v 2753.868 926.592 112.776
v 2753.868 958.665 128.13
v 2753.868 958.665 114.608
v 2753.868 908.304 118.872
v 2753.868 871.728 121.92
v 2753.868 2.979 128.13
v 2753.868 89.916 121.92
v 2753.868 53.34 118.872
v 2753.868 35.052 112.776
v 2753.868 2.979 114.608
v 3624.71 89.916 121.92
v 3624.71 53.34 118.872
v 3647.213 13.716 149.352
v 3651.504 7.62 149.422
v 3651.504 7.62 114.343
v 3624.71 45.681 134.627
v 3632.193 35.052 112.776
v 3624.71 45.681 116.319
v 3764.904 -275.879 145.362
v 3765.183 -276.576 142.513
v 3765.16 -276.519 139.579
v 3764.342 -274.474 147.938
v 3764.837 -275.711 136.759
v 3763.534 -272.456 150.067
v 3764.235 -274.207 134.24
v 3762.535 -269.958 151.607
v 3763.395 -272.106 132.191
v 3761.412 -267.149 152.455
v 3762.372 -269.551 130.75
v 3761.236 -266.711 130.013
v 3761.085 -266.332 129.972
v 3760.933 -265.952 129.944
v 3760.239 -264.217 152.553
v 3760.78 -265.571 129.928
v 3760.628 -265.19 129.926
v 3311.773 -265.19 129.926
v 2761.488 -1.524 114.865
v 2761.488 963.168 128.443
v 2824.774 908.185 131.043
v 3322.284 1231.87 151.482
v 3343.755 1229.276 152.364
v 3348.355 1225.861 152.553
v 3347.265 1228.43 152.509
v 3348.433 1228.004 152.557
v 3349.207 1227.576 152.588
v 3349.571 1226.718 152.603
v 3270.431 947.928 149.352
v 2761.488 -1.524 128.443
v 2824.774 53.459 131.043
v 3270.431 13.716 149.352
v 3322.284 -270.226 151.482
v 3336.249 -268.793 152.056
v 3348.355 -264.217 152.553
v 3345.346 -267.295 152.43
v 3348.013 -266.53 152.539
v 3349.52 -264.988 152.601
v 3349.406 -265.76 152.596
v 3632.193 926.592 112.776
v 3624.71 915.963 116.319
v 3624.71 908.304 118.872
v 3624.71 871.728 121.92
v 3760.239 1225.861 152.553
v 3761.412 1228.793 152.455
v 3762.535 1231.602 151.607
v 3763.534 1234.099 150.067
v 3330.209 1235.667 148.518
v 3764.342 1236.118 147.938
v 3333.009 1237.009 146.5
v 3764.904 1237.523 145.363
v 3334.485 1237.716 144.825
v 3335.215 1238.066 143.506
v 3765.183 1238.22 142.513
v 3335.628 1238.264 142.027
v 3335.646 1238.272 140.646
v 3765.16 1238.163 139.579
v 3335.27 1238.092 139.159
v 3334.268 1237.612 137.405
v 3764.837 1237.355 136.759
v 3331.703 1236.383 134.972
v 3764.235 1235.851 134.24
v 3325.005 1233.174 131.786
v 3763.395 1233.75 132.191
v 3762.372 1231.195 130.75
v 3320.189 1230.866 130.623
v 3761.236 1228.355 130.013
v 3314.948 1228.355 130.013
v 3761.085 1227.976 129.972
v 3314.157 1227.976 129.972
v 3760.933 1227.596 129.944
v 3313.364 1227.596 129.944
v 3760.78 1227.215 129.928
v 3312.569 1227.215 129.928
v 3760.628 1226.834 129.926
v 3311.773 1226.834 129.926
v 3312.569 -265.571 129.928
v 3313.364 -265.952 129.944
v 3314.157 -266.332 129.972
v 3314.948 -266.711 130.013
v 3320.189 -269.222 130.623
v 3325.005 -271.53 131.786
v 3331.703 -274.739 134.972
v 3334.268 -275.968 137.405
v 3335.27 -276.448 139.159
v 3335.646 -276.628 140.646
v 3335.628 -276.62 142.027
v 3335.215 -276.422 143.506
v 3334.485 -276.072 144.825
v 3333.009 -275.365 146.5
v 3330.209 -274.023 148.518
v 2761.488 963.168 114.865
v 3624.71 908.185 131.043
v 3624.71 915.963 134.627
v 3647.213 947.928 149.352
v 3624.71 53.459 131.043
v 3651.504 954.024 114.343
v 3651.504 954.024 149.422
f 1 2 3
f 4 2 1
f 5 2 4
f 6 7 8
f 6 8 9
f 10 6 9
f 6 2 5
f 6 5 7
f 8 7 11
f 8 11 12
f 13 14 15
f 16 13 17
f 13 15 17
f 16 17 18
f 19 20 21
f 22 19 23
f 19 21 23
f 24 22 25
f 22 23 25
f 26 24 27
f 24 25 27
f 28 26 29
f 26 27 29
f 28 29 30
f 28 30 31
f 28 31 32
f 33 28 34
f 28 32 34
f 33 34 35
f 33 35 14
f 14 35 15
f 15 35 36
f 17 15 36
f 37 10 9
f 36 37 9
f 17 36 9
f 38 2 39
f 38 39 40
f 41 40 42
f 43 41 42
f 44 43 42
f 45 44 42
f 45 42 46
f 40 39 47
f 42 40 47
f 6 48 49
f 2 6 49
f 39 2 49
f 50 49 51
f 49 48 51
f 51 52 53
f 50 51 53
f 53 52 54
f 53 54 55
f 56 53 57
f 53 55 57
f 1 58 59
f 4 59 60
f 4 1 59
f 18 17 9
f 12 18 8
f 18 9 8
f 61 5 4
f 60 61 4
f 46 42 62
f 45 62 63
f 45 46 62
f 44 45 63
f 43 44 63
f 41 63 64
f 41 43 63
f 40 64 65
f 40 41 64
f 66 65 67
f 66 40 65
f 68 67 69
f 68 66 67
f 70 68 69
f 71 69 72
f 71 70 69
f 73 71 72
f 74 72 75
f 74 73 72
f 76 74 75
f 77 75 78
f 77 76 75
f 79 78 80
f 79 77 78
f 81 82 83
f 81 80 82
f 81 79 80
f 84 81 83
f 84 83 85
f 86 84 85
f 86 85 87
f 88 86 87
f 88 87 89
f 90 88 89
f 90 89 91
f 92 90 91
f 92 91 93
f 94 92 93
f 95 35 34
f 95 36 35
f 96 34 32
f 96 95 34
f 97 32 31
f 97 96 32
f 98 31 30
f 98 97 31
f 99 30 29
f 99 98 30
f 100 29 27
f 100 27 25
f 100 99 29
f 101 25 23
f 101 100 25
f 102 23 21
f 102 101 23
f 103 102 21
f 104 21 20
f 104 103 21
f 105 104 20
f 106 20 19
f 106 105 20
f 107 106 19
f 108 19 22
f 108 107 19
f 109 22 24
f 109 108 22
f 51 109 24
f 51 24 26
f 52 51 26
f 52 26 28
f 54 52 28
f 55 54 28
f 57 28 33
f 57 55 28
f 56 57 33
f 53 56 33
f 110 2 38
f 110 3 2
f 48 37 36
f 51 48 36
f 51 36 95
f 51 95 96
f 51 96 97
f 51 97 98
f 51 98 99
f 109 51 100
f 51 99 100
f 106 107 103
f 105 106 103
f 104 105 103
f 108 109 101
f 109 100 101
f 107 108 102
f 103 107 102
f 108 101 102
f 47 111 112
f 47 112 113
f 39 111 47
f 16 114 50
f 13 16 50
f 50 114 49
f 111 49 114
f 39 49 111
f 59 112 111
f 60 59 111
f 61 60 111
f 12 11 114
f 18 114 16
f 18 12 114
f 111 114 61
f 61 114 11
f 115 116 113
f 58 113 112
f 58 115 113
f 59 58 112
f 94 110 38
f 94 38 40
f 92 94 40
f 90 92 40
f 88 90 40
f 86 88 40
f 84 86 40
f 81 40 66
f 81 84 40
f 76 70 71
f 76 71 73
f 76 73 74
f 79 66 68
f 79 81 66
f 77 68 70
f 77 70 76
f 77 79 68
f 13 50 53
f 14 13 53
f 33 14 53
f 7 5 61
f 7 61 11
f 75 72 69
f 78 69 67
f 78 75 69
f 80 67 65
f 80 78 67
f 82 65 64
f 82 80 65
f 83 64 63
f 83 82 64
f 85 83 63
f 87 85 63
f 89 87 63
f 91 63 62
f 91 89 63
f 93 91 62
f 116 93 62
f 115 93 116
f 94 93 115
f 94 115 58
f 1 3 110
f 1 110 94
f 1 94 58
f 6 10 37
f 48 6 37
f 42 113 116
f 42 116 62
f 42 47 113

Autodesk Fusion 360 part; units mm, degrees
sketch "Sketch9" plane through (0, 0, 0) normal (0, 0, 1) x (1, 0, 0)
  line L0 (3776.472, 1266.444) -> (3776.472, -304.8)
  line L1 (3776.472, 480.822) -> (2072.6401, 480.822)
  line L2 (3775.8634, 1264.9224) -> (3651.504, 954.024)
  line L3 (3651.504, 954.024) -> (3624.7105, 915.963)
  line L4 (2627.376, 883.92) -> (2761.488, 963.168)
  line L5 (2761.488, 963.168) -> (3394.4421, 1266.444)
  line L6 (3394.4421, 1266.444) -> (3775.8634, 1264.9224)
  line L7 (3775.8634, -303.2784) -> (3651.504, 7.62)
  line L8 (3651.504, 7.62) -> (3624.7105, 45.681)
  line L9 (2761.488, -1.524) -> (3394.4421, -304.8)
  line L10 (3394.4421, -304.8) -> (3775.8634, -303.2784)
  line L11 (2627.376, 77.724) -> (2761.488, -1.524)
  line L12 (2627.376, 883.92) -> (2627.376, 77.724)
  line L13 (3624.7105, 915.963) -> (3624.7105, 45.681)
  point P0 (3776.472, -304.8)
extrude "Extrude6" add sketch "Sketch9" along normal blind 213.36
sketch "Sketch10" plane through (0, 0, 0) normal (1, 0, 0) x (0, 1, 0)
  line L0 (1266.444, 220.98) -> (-304.8, 220.98) construction
  line L1 (480.822, 220.98) -> (480.822, -213.36)
  line L2 (908.185, 131.0434) -> (947.928, 149.352)
  line L3 (947.928, 149.352) -> (1225.8609, 152.5533)
  line L4 (1228.3549, 130.0128) -> (926.592, 112.776)
  line L5 (926.592, 112.776) -> (908.304, 118.872)
  arc A0 (1226.8338, 129.9259) -> (1225.8609, 152.5533) centre (1226.9491, 141.2655) ccw
  line L6 (908.185, 131.0434) -> (871.728, 131.0434)
  line L7 (871.728, 231.648) -> (1286.256, 231.648)
  line L8 (1286.256, 231.648) -> (1286.256, -12.192)
  line L9 (1286.256, -12.192) -> (871.728, -12.192)
  line L10 (871.728, 121.92) -> (908.304, 118.872)
  line L11 (53.459, 131.0434) -> (89.916, 131.0434)
  line L12 (53.459, 131.0434) -> (13.716, 149.352)
  line L13 (13.716, 149.352) -> (-264.2169, 152.5533)
  arc A1 (-264.2169, 152.5533) -> (-265.1898, 129.9259) centre (-265.3051, 141.2655) ccw
  line L14 (-266.7108, 130.0128) -> (35.052, 112.776)
  line L15 (35.052, 112.776) -> (53.34, 118.872)
  line L16 (89.916, 121.92) -> (53.34, 118.872)
  line L17 (-324.612, -12.192) -> (89.916, -12.192)
  line L18 (-324.612, 231.648) -> (-324.612, -12.192)
  line L19 (89.916, 231.648) -> (-324.612, 231.648)
  line L20 (871.728, 231.648) -> (89.916, 231.648)
  line L21 (871.728, -12.192) -> (89.916, -12.192)
  line L22 (871.728, 121.92) -> (89.916, 121.92)
  line L23 (871.728, 131.0434) -> (89.916, 131.0434)
extrude "Extrude7" cut sketch "Sketch10" along normal blind 4145.28
sketch "Sketch11" plane through (0, 0, 0) normal (0, 1, 0) x (1, 0, 0)
  line L0 (2590.8001, -213.36) -> (3810.0001, -213.36)
  line L1 (3810.0001, -213.36) -> (3810.0001, -30.48)
  line L2 (3810.0001, -30.48) -> (2590.8001, -30.48)
  line L3 (2590.8001, -30.48) -> (2590.8001, -213.36)
  line L4 (2753.8681, -128.1304) -> (2753.8681, -112.776)
  line L5 (2753.8681, -112.776) -> (3346.704, -91.44)
  line L6 (3346.704, -91.44) -> (3779.5201, -91.44)
  line L7 (3779.5201, -91.44) -> (3779.5201, -170.688)
  line L8 (2753.8681, -128.1304) -> (3493.008, -158.496)
  line L9 (3493.008, -158.496) -> (3779.5201, -170.688)
extrude "Extrude8" cut sketch "Sketch11" along normal mid plane 3108.96
